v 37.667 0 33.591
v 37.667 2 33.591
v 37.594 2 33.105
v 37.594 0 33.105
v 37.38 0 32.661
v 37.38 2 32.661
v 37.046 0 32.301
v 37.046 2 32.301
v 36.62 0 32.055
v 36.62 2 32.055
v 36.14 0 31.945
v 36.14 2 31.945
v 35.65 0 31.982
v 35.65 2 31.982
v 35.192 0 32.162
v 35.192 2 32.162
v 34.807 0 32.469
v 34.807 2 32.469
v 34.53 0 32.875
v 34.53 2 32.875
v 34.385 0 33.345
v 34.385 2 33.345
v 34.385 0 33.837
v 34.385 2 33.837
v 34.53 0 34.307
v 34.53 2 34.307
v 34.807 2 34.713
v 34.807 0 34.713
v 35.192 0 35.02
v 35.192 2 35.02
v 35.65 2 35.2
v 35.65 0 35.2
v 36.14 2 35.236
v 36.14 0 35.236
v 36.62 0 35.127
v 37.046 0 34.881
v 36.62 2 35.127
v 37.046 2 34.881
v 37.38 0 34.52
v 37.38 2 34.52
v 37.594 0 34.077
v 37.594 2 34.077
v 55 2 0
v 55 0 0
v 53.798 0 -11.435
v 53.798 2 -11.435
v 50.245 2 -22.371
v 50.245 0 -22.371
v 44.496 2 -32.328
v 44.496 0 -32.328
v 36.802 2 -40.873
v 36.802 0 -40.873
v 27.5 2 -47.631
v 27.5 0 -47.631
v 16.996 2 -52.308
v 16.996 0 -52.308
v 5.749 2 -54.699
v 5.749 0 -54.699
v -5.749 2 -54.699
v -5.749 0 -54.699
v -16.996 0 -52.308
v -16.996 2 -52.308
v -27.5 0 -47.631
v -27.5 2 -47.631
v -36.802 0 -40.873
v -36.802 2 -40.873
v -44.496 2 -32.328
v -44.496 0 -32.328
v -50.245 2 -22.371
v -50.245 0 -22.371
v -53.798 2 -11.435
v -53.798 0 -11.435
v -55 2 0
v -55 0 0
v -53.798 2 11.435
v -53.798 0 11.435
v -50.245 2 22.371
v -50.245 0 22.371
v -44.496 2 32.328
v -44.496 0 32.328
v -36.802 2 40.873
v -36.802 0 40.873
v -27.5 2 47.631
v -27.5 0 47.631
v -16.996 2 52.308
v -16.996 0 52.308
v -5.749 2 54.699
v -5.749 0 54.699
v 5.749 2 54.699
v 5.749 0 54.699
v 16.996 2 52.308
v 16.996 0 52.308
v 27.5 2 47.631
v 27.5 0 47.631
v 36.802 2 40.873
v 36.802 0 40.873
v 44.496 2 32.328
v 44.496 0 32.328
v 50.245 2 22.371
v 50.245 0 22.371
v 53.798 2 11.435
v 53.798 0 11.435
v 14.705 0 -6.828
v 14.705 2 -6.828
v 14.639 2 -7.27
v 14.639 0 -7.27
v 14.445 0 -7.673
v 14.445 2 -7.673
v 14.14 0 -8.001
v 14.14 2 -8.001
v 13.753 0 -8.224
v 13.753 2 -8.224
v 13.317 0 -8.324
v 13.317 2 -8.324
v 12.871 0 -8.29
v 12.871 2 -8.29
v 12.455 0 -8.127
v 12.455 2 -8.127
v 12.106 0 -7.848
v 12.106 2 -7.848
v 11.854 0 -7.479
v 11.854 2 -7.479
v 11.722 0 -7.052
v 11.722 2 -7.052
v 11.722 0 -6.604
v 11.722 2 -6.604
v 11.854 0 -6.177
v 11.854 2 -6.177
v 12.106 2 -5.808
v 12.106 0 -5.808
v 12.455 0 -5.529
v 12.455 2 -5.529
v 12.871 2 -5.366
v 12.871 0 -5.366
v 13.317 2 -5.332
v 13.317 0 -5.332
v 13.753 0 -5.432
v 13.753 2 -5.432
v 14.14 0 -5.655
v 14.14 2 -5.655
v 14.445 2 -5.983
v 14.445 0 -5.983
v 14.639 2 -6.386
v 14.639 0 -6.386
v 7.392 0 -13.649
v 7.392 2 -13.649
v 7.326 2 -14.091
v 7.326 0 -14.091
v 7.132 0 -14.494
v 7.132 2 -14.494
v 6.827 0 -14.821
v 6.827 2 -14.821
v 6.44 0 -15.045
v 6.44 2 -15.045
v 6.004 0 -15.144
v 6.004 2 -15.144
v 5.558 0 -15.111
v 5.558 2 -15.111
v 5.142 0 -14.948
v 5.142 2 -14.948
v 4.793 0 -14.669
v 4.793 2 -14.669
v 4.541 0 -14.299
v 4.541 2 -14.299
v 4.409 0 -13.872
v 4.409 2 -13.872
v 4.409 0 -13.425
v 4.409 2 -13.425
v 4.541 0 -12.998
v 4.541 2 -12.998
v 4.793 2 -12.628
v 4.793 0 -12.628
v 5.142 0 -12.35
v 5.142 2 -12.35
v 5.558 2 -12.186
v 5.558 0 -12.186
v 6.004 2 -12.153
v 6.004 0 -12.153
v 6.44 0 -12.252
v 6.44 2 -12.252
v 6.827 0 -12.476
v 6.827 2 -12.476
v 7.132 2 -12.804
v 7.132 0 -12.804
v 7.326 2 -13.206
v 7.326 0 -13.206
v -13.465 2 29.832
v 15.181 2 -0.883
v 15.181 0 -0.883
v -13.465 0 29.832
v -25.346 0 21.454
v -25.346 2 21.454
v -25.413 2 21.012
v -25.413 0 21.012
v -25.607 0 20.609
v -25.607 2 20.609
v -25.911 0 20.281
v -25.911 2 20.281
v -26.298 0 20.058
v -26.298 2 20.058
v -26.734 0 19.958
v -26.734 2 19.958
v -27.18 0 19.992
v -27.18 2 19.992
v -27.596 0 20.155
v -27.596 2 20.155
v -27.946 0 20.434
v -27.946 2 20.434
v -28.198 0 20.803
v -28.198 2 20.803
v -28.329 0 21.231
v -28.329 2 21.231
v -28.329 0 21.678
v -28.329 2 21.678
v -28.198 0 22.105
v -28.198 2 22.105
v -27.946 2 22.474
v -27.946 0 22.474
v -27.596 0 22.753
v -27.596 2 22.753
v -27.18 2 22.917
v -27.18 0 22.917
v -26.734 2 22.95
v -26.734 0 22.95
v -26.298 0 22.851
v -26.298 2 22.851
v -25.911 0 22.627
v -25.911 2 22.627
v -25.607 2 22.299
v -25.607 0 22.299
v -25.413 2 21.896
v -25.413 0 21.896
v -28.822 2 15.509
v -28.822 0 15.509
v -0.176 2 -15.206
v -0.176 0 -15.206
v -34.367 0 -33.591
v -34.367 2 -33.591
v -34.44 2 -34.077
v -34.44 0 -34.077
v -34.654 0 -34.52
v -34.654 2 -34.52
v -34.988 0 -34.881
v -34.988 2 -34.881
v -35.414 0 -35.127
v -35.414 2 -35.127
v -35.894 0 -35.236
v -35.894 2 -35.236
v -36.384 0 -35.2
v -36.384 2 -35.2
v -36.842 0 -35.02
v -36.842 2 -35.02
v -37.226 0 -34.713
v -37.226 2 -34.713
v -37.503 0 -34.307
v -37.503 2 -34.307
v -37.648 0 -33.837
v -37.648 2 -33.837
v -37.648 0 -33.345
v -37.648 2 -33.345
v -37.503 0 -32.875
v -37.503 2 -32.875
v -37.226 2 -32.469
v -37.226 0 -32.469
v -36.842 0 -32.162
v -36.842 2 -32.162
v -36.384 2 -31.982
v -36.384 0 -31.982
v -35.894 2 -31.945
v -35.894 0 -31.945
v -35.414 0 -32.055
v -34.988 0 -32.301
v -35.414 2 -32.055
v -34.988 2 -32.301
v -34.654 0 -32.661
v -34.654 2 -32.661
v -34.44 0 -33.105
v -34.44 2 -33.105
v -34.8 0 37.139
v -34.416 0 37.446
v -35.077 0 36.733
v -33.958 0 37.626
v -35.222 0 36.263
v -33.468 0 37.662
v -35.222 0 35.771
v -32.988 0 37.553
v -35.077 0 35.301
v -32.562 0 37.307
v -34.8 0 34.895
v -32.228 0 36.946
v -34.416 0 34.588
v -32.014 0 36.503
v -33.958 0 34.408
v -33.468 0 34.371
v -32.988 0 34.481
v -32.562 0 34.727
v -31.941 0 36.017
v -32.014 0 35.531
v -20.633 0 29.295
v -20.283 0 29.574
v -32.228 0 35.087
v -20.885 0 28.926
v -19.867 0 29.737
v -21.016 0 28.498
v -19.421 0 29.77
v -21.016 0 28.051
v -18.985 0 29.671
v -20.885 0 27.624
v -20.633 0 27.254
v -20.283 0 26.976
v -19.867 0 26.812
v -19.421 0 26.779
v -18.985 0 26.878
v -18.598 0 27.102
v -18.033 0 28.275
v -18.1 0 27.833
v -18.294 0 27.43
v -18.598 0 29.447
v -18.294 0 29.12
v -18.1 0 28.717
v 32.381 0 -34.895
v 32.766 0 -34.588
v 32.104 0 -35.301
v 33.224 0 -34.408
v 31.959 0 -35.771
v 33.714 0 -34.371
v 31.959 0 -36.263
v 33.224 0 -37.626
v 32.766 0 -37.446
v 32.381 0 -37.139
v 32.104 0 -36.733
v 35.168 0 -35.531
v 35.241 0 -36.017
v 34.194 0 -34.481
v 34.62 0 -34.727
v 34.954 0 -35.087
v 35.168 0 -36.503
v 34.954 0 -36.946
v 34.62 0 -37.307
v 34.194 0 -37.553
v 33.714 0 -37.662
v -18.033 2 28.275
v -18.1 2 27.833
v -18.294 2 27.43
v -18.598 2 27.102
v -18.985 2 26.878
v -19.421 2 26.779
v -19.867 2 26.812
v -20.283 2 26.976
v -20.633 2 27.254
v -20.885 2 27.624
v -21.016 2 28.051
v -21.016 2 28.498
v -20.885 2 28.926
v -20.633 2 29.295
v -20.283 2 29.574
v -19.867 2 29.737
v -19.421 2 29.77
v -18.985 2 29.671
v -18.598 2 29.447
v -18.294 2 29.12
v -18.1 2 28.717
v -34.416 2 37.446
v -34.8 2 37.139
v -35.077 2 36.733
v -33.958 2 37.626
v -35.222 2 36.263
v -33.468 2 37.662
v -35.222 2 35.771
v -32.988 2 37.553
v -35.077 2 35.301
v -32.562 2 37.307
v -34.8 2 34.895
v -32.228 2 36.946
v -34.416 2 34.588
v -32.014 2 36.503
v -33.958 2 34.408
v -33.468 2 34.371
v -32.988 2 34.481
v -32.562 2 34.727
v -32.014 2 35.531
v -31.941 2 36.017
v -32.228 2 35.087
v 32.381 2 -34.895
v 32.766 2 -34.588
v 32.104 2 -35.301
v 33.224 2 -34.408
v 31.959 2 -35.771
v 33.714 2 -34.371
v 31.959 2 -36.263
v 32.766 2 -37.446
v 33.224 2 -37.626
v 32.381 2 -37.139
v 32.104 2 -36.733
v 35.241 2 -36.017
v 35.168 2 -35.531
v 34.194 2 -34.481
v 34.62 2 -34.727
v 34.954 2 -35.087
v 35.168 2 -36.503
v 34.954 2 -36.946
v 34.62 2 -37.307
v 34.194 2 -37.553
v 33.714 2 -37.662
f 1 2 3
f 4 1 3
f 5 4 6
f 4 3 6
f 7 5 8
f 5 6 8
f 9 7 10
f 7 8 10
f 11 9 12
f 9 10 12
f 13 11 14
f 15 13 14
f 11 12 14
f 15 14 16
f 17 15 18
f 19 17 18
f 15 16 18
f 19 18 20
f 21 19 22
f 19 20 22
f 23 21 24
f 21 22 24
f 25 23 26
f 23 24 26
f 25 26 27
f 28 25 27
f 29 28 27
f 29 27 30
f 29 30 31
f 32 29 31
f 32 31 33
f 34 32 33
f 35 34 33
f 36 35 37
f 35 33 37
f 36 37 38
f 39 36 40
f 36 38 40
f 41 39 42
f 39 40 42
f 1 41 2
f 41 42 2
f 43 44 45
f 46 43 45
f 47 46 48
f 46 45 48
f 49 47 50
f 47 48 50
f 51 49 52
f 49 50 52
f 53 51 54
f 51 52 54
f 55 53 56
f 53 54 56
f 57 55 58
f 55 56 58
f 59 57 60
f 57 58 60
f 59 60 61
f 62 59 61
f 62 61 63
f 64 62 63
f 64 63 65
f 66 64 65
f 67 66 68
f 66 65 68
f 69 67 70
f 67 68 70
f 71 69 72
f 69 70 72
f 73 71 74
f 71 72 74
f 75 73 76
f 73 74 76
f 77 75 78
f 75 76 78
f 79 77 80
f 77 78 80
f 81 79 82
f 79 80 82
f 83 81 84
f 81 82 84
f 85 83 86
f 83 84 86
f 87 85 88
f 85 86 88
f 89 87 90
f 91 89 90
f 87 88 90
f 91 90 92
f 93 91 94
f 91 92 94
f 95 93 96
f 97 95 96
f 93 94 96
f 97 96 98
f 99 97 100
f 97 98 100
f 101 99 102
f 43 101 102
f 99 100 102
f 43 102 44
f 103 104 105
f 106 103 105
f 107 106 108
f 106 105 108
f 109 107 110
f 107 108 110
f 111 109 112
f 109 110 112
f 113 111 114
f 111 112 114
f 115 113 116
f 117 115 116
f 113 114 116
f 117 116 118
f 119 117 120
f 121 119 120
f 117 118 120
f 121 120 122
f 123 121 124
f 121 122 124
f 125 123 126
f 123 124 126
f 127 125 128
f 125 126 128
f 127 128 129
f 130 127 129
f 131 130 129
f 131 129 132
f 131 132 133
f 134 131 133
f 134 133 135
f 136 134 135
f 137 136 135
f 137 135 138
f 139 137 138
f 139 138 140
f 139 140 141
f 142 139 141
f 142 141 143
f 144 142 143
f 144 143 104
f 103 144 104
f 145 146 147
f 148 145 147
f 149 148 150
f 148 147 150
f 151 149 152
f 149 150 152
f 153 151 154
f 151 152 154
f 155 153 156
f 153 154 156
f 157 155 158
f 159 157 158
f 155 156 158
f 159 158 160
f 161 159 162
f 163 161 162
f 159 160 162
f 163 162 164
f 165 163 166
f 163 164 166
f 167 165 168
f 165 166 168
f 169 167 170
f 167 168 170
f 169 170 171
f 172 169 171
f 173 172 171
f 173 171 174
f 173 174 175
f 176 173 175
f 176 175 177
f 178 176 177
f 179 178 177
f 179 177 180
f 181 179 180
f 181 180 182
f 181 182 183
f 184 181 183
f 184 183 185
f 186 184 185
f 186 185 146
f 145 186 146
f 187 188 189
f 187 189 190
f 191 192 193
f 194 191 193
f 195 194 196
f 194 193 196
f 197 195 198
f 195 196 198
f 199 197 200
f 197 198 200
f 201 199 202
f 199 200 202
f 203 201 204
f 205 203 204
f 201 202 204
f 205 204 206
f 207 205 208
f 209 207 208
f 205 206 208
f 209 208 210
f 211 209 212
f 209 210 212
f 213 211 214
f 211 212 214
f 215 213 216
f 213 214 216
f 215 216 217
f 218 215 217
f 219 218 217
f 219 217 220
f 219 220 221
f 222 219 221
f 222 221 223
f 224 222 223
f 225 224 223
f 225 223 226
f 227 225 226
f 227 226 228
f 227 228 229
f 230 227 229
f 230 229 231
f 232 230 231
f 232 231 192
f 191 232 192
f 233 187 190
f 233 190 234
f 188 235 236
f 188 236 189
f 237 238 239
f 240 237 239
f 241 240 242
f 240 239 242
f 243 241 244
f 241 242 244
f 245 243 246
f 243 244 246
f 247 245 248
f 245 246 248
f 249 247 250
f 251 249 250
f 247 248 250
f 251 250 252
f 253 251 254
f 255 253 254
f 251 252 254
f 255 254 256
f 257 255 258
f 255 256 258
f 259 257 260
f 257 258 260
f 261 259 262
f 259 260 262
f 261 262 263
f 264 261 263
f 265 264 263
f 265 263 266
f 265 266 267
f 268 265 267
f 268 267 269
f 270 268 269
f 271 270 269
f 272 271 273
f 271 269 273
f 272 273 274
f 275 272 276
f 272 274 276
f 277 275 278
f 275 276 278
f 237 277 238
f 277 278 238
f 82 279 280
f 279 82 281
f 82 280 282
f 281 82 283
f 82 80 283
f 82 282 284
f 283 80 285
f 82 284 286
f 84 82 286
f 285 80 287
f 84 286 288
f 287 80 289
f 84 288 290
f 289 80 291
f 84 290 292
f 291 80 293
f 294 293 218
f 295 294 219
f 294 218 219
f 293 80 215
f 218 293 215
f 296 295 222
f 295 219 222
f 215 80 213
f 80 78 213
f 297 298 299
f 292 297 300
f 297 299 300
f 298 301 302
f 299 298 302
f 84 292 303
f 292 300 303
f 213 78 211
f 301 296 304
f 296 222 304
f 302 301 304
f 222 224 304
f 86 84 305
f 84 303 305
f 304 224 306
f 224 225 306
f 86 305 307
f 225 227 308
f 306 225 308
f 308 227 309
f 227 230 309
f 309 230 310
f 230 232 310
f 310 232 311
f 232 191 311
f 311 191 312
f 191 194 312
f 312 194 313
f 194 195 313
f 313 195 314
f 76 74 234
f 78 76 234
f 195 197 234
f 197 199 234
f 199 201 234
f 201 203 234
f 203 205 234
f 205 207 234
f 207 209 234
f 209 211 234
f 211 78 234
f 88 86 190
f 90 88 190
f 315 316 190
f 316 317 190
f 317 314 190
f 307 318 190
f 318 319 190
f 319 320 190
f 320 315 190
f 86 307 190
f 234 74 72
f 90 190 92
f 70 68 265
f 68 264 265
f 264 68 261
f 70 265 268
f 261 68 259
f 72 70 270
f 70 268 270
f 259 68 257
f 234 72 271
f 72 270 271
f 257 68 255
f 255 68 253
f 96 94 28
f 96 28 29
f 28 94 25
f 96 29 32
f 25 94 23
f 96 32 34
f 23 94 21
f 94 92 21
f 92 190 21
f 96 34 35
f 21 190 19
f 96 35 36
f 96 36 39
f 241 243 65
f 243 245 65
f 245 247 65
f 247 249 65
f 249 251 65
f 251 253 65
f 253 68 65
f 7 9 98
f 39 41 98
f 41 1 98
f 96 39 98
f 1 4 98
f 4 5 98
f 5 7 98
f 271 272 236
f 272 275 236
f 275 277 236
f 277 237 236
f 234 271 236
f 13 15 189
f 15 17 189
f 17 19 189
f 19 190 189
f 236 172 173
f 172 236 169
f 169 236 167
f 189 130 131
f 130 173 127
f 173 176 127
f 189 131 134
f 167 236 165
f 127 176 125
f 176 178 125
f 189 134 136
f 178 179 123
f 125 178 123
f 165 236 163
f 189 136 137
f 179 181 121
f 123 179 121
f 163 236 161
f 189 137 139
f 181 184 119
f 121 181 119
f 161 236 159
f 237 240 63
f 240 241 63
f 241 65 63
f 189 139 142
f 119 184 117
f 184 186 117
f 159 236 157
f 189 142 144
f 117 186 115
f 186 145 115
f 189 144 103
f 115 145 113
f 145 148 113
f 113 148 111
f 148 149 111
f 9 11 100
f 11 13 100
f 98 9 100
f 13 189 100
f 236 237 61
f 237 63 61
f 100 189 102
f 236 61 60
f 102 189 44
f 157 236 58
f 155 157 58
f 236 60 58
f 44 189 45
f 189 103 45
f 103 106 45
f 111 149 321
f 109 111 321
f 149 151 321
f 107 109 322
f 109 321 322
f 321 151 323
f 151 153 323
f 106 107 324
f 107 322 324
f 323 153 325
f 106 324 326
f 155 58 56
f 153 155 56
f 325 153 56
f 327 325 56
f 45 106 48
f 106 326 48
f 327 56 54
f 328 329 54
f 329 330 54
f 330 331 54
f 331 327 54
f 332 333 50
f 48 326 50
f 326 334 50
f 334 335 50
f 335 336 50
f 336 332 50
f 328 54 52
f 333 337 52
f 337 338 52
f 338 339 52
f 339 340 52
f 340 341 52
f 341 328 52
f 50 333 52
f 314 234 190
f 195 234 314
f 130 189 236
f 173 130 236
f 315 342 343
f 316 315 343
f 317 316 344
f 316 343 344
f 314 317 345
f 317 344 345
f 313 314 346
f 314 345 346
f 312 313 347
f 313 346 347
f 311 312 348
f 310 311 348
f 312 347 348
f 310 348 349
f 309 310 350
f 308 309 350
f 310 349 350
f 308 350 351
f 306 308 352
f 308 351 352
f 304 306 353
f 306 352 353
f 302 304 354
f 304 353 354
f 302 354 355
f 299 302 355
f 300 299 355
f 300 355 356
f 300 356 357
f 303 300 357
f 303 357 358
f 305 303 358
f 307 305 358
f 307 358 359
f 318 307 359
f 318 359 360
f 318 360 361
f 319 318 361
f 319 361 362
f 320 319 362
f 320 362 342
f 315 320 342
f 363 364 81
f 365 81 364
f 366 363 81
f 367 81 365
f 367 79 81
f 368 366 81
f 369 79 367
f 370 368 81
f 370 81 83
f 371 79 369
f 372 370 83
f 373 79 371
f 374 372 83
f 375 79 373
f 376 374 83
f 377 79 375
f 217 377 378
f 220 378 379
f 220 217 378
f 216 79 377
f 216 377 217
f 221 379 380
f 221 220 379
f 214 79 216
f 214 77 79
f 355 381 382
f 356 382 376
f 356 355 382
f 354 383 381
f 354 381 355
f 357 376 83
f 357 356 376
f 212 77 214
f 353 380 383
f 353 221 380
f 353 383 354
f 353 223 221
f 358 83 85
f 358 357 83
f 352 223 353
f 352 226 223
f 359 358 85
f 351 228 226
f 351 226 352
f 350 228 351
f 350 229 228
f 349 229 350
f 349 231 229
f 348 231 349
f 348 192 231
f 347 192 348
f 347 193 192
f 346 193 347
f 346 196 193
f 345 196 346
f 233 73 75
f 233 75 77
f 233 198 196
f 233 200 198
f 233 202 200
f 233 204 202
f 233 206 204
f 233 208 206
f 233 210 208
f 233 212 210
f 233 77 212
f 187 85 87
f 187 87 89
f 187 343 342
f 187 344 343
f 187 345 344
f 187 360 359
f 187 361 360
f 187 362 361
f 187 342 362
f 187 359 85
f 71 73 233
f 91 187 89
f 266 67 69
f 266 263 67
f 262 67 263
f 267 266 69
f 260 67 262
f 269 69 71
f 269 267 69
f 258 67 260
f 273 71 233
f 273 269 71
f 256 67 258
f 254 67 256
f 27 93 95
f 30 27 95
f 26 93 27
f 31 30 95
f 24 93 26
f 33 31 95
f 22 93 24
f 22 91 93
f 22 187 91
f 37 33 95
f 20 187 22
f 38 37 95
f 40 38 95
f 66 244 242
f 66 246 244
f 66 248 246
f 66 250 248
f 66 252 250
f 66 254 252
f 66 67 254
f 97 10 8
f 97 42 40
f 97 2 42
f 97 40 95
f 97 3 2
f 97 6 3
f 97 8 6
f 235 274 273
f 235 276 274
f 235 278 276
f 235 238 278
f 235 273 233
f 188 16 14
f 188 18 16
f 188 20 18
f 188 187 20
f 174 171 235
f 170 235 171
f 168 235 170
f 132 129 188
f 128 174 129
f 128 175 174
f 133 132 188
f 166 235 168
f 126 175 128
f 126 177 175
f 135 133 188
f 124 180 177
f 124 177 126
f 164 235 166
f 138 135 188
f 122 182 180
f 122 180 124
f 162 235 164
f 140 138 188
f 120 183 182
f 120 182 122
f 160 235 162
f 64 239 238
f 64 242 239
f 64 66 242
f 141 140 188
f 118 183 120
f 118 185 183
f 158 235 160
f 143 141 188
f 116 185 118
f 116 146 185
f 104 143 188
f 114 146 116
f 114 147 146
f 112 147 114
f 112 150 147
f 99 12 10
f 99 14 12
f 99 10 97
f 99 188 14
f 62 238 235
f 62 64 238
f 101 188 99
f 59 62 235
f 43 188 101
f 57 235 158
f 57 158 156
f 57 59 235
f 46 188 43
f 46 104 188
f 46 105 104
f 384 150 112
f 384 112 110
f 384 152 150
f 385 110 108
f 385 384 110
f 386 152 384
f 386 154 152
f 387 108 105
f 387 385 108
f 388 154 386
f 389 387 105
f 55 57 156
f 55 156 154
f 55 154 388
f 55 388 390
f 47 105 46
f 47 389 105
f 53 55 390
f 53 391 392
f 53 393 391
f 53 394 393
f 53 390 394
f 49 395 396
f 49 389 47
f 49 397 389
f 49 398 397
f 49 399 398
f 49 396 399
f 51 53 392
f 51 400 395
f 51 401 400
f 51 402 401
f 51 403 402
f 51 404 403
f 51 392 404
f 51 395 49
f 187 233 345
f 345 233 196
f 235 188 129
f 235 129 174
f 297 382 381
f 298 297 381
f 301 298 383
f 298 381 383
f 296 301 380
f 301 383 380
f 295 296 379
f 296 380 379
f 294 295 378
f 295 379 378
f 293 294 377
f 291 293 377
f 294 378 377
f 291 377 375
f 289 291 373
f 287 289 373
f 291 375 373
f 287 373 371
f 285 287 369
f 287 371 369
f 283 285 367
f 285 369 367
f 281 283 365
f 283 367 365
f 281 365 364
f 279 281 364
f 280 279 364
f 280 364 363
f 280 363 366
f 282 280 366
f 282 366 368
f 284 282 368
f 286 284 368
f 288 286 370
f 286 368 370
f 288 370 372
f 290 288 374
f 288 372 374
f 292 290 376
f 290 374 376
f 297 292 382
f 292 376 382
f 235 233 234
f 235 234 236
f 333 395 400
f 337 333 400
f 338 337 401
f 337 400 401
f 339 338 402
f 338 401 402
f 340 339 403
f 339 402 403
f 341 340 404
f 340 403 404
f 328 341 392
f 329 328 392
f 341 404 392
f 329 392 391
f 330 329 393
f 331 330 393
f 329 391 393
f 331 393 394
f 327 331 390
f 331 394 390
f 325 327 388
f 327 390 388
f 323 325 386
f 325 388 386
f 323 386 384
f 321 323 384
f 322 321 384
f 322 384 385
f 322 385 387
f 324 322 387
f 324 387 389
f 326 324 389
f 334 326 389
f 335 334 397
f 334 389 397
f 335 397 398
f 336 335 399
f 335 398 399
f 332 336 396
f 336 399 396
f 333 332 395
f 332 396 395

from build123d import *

# Parameters (mm, degrees)
SKETCH_1_R          = 55
EXTRUDE_1_DEPTH     = 2
SKETCH_2_R          = 1.65
CUT_EXTRUDE_1_DEPTH = 2
SKETCH_2_4_R        = 1.65
CUT_EXTRUDE_3_DEPTH = 2
SKETCH_3_R          = 1.5
CUT_EXTRUDE_4_DEPTH = 10


with BuildPart() as part:
    # 草图1 → 凸台-拉伸1 (new body)
    with BuildSketch(Plane(origin=(0, 0, 0), x_dir=(1, 0, 0), z_dir=(0, 1, 0))):
        Circle(SKETCH_1_R)
    extrude(amount=EXTRUDE_1_DEPTH)

    # 草图2 → 切除-拉伸1 (cut)
    with BuildSketch(Plane(origin=(0, 2, 0), x_dir=(1, 0, 0), z_dir=(0, 1, 0))):
        with Locations((36.016872787, -33.590882314)):
            Circle(SKETCH_2_R)
    extrude(amount=-CUT_EXTRUDE_1_DEPTH, mode=Mode.SUBTRACT)

    # 草图2<4> → 切除-拉伸3 (cut)
    with BuildSketch(Plane(origin=(0, 2, 0), x_dir=(1, 0, 0), z_dir=(0, 1, 0))):
        with Locations((-36.016872787, 33.590882314)):
            Circle(SKETCH_2_4_R)
        with Locations((33.590882314, 36.016872787)):
            Circle(SKETCH_2_4_R)
        with Locations((-33.590882314, -36.016872787)):
            Circle(SKETCH_2_4_R)
    extrude(amount=-CUT_EXTRUDE_3_DEPTH, mode=Mode.SUBTRACT)

    # 草图3 → 切除-拉伸4 (cut)
    with BuildSketch(Plane(origin=(0, 2, 0), x_dir=(1, 0, 0), z_dir=(0, 1, 0))):
        with Locations((-26.846179952, -21.454198237)):
            Circle(SKETCH_3_R)
        with Locations((-19.533109335, -28.274681956)):
            Circle(SKETCH_3_R)
        with Locations((5.892141898, 13.648540723)):
            Circle(SKETCH_3_R)
        with Locations((13.205212514, 6.828057004)):
            Circle(SKETCH_3_R)
        Polygon((-28.822223675, -15.509011007), (-0.176192057, 15.205885583), (15.181256238, 0.882869774), (-13.46477538, -29.832026816), align=None)
    extrude(amount=-CUT_EXTRUDE_4_DEPTH, mode=Mode.SUBTRACT)


solid = part.part
